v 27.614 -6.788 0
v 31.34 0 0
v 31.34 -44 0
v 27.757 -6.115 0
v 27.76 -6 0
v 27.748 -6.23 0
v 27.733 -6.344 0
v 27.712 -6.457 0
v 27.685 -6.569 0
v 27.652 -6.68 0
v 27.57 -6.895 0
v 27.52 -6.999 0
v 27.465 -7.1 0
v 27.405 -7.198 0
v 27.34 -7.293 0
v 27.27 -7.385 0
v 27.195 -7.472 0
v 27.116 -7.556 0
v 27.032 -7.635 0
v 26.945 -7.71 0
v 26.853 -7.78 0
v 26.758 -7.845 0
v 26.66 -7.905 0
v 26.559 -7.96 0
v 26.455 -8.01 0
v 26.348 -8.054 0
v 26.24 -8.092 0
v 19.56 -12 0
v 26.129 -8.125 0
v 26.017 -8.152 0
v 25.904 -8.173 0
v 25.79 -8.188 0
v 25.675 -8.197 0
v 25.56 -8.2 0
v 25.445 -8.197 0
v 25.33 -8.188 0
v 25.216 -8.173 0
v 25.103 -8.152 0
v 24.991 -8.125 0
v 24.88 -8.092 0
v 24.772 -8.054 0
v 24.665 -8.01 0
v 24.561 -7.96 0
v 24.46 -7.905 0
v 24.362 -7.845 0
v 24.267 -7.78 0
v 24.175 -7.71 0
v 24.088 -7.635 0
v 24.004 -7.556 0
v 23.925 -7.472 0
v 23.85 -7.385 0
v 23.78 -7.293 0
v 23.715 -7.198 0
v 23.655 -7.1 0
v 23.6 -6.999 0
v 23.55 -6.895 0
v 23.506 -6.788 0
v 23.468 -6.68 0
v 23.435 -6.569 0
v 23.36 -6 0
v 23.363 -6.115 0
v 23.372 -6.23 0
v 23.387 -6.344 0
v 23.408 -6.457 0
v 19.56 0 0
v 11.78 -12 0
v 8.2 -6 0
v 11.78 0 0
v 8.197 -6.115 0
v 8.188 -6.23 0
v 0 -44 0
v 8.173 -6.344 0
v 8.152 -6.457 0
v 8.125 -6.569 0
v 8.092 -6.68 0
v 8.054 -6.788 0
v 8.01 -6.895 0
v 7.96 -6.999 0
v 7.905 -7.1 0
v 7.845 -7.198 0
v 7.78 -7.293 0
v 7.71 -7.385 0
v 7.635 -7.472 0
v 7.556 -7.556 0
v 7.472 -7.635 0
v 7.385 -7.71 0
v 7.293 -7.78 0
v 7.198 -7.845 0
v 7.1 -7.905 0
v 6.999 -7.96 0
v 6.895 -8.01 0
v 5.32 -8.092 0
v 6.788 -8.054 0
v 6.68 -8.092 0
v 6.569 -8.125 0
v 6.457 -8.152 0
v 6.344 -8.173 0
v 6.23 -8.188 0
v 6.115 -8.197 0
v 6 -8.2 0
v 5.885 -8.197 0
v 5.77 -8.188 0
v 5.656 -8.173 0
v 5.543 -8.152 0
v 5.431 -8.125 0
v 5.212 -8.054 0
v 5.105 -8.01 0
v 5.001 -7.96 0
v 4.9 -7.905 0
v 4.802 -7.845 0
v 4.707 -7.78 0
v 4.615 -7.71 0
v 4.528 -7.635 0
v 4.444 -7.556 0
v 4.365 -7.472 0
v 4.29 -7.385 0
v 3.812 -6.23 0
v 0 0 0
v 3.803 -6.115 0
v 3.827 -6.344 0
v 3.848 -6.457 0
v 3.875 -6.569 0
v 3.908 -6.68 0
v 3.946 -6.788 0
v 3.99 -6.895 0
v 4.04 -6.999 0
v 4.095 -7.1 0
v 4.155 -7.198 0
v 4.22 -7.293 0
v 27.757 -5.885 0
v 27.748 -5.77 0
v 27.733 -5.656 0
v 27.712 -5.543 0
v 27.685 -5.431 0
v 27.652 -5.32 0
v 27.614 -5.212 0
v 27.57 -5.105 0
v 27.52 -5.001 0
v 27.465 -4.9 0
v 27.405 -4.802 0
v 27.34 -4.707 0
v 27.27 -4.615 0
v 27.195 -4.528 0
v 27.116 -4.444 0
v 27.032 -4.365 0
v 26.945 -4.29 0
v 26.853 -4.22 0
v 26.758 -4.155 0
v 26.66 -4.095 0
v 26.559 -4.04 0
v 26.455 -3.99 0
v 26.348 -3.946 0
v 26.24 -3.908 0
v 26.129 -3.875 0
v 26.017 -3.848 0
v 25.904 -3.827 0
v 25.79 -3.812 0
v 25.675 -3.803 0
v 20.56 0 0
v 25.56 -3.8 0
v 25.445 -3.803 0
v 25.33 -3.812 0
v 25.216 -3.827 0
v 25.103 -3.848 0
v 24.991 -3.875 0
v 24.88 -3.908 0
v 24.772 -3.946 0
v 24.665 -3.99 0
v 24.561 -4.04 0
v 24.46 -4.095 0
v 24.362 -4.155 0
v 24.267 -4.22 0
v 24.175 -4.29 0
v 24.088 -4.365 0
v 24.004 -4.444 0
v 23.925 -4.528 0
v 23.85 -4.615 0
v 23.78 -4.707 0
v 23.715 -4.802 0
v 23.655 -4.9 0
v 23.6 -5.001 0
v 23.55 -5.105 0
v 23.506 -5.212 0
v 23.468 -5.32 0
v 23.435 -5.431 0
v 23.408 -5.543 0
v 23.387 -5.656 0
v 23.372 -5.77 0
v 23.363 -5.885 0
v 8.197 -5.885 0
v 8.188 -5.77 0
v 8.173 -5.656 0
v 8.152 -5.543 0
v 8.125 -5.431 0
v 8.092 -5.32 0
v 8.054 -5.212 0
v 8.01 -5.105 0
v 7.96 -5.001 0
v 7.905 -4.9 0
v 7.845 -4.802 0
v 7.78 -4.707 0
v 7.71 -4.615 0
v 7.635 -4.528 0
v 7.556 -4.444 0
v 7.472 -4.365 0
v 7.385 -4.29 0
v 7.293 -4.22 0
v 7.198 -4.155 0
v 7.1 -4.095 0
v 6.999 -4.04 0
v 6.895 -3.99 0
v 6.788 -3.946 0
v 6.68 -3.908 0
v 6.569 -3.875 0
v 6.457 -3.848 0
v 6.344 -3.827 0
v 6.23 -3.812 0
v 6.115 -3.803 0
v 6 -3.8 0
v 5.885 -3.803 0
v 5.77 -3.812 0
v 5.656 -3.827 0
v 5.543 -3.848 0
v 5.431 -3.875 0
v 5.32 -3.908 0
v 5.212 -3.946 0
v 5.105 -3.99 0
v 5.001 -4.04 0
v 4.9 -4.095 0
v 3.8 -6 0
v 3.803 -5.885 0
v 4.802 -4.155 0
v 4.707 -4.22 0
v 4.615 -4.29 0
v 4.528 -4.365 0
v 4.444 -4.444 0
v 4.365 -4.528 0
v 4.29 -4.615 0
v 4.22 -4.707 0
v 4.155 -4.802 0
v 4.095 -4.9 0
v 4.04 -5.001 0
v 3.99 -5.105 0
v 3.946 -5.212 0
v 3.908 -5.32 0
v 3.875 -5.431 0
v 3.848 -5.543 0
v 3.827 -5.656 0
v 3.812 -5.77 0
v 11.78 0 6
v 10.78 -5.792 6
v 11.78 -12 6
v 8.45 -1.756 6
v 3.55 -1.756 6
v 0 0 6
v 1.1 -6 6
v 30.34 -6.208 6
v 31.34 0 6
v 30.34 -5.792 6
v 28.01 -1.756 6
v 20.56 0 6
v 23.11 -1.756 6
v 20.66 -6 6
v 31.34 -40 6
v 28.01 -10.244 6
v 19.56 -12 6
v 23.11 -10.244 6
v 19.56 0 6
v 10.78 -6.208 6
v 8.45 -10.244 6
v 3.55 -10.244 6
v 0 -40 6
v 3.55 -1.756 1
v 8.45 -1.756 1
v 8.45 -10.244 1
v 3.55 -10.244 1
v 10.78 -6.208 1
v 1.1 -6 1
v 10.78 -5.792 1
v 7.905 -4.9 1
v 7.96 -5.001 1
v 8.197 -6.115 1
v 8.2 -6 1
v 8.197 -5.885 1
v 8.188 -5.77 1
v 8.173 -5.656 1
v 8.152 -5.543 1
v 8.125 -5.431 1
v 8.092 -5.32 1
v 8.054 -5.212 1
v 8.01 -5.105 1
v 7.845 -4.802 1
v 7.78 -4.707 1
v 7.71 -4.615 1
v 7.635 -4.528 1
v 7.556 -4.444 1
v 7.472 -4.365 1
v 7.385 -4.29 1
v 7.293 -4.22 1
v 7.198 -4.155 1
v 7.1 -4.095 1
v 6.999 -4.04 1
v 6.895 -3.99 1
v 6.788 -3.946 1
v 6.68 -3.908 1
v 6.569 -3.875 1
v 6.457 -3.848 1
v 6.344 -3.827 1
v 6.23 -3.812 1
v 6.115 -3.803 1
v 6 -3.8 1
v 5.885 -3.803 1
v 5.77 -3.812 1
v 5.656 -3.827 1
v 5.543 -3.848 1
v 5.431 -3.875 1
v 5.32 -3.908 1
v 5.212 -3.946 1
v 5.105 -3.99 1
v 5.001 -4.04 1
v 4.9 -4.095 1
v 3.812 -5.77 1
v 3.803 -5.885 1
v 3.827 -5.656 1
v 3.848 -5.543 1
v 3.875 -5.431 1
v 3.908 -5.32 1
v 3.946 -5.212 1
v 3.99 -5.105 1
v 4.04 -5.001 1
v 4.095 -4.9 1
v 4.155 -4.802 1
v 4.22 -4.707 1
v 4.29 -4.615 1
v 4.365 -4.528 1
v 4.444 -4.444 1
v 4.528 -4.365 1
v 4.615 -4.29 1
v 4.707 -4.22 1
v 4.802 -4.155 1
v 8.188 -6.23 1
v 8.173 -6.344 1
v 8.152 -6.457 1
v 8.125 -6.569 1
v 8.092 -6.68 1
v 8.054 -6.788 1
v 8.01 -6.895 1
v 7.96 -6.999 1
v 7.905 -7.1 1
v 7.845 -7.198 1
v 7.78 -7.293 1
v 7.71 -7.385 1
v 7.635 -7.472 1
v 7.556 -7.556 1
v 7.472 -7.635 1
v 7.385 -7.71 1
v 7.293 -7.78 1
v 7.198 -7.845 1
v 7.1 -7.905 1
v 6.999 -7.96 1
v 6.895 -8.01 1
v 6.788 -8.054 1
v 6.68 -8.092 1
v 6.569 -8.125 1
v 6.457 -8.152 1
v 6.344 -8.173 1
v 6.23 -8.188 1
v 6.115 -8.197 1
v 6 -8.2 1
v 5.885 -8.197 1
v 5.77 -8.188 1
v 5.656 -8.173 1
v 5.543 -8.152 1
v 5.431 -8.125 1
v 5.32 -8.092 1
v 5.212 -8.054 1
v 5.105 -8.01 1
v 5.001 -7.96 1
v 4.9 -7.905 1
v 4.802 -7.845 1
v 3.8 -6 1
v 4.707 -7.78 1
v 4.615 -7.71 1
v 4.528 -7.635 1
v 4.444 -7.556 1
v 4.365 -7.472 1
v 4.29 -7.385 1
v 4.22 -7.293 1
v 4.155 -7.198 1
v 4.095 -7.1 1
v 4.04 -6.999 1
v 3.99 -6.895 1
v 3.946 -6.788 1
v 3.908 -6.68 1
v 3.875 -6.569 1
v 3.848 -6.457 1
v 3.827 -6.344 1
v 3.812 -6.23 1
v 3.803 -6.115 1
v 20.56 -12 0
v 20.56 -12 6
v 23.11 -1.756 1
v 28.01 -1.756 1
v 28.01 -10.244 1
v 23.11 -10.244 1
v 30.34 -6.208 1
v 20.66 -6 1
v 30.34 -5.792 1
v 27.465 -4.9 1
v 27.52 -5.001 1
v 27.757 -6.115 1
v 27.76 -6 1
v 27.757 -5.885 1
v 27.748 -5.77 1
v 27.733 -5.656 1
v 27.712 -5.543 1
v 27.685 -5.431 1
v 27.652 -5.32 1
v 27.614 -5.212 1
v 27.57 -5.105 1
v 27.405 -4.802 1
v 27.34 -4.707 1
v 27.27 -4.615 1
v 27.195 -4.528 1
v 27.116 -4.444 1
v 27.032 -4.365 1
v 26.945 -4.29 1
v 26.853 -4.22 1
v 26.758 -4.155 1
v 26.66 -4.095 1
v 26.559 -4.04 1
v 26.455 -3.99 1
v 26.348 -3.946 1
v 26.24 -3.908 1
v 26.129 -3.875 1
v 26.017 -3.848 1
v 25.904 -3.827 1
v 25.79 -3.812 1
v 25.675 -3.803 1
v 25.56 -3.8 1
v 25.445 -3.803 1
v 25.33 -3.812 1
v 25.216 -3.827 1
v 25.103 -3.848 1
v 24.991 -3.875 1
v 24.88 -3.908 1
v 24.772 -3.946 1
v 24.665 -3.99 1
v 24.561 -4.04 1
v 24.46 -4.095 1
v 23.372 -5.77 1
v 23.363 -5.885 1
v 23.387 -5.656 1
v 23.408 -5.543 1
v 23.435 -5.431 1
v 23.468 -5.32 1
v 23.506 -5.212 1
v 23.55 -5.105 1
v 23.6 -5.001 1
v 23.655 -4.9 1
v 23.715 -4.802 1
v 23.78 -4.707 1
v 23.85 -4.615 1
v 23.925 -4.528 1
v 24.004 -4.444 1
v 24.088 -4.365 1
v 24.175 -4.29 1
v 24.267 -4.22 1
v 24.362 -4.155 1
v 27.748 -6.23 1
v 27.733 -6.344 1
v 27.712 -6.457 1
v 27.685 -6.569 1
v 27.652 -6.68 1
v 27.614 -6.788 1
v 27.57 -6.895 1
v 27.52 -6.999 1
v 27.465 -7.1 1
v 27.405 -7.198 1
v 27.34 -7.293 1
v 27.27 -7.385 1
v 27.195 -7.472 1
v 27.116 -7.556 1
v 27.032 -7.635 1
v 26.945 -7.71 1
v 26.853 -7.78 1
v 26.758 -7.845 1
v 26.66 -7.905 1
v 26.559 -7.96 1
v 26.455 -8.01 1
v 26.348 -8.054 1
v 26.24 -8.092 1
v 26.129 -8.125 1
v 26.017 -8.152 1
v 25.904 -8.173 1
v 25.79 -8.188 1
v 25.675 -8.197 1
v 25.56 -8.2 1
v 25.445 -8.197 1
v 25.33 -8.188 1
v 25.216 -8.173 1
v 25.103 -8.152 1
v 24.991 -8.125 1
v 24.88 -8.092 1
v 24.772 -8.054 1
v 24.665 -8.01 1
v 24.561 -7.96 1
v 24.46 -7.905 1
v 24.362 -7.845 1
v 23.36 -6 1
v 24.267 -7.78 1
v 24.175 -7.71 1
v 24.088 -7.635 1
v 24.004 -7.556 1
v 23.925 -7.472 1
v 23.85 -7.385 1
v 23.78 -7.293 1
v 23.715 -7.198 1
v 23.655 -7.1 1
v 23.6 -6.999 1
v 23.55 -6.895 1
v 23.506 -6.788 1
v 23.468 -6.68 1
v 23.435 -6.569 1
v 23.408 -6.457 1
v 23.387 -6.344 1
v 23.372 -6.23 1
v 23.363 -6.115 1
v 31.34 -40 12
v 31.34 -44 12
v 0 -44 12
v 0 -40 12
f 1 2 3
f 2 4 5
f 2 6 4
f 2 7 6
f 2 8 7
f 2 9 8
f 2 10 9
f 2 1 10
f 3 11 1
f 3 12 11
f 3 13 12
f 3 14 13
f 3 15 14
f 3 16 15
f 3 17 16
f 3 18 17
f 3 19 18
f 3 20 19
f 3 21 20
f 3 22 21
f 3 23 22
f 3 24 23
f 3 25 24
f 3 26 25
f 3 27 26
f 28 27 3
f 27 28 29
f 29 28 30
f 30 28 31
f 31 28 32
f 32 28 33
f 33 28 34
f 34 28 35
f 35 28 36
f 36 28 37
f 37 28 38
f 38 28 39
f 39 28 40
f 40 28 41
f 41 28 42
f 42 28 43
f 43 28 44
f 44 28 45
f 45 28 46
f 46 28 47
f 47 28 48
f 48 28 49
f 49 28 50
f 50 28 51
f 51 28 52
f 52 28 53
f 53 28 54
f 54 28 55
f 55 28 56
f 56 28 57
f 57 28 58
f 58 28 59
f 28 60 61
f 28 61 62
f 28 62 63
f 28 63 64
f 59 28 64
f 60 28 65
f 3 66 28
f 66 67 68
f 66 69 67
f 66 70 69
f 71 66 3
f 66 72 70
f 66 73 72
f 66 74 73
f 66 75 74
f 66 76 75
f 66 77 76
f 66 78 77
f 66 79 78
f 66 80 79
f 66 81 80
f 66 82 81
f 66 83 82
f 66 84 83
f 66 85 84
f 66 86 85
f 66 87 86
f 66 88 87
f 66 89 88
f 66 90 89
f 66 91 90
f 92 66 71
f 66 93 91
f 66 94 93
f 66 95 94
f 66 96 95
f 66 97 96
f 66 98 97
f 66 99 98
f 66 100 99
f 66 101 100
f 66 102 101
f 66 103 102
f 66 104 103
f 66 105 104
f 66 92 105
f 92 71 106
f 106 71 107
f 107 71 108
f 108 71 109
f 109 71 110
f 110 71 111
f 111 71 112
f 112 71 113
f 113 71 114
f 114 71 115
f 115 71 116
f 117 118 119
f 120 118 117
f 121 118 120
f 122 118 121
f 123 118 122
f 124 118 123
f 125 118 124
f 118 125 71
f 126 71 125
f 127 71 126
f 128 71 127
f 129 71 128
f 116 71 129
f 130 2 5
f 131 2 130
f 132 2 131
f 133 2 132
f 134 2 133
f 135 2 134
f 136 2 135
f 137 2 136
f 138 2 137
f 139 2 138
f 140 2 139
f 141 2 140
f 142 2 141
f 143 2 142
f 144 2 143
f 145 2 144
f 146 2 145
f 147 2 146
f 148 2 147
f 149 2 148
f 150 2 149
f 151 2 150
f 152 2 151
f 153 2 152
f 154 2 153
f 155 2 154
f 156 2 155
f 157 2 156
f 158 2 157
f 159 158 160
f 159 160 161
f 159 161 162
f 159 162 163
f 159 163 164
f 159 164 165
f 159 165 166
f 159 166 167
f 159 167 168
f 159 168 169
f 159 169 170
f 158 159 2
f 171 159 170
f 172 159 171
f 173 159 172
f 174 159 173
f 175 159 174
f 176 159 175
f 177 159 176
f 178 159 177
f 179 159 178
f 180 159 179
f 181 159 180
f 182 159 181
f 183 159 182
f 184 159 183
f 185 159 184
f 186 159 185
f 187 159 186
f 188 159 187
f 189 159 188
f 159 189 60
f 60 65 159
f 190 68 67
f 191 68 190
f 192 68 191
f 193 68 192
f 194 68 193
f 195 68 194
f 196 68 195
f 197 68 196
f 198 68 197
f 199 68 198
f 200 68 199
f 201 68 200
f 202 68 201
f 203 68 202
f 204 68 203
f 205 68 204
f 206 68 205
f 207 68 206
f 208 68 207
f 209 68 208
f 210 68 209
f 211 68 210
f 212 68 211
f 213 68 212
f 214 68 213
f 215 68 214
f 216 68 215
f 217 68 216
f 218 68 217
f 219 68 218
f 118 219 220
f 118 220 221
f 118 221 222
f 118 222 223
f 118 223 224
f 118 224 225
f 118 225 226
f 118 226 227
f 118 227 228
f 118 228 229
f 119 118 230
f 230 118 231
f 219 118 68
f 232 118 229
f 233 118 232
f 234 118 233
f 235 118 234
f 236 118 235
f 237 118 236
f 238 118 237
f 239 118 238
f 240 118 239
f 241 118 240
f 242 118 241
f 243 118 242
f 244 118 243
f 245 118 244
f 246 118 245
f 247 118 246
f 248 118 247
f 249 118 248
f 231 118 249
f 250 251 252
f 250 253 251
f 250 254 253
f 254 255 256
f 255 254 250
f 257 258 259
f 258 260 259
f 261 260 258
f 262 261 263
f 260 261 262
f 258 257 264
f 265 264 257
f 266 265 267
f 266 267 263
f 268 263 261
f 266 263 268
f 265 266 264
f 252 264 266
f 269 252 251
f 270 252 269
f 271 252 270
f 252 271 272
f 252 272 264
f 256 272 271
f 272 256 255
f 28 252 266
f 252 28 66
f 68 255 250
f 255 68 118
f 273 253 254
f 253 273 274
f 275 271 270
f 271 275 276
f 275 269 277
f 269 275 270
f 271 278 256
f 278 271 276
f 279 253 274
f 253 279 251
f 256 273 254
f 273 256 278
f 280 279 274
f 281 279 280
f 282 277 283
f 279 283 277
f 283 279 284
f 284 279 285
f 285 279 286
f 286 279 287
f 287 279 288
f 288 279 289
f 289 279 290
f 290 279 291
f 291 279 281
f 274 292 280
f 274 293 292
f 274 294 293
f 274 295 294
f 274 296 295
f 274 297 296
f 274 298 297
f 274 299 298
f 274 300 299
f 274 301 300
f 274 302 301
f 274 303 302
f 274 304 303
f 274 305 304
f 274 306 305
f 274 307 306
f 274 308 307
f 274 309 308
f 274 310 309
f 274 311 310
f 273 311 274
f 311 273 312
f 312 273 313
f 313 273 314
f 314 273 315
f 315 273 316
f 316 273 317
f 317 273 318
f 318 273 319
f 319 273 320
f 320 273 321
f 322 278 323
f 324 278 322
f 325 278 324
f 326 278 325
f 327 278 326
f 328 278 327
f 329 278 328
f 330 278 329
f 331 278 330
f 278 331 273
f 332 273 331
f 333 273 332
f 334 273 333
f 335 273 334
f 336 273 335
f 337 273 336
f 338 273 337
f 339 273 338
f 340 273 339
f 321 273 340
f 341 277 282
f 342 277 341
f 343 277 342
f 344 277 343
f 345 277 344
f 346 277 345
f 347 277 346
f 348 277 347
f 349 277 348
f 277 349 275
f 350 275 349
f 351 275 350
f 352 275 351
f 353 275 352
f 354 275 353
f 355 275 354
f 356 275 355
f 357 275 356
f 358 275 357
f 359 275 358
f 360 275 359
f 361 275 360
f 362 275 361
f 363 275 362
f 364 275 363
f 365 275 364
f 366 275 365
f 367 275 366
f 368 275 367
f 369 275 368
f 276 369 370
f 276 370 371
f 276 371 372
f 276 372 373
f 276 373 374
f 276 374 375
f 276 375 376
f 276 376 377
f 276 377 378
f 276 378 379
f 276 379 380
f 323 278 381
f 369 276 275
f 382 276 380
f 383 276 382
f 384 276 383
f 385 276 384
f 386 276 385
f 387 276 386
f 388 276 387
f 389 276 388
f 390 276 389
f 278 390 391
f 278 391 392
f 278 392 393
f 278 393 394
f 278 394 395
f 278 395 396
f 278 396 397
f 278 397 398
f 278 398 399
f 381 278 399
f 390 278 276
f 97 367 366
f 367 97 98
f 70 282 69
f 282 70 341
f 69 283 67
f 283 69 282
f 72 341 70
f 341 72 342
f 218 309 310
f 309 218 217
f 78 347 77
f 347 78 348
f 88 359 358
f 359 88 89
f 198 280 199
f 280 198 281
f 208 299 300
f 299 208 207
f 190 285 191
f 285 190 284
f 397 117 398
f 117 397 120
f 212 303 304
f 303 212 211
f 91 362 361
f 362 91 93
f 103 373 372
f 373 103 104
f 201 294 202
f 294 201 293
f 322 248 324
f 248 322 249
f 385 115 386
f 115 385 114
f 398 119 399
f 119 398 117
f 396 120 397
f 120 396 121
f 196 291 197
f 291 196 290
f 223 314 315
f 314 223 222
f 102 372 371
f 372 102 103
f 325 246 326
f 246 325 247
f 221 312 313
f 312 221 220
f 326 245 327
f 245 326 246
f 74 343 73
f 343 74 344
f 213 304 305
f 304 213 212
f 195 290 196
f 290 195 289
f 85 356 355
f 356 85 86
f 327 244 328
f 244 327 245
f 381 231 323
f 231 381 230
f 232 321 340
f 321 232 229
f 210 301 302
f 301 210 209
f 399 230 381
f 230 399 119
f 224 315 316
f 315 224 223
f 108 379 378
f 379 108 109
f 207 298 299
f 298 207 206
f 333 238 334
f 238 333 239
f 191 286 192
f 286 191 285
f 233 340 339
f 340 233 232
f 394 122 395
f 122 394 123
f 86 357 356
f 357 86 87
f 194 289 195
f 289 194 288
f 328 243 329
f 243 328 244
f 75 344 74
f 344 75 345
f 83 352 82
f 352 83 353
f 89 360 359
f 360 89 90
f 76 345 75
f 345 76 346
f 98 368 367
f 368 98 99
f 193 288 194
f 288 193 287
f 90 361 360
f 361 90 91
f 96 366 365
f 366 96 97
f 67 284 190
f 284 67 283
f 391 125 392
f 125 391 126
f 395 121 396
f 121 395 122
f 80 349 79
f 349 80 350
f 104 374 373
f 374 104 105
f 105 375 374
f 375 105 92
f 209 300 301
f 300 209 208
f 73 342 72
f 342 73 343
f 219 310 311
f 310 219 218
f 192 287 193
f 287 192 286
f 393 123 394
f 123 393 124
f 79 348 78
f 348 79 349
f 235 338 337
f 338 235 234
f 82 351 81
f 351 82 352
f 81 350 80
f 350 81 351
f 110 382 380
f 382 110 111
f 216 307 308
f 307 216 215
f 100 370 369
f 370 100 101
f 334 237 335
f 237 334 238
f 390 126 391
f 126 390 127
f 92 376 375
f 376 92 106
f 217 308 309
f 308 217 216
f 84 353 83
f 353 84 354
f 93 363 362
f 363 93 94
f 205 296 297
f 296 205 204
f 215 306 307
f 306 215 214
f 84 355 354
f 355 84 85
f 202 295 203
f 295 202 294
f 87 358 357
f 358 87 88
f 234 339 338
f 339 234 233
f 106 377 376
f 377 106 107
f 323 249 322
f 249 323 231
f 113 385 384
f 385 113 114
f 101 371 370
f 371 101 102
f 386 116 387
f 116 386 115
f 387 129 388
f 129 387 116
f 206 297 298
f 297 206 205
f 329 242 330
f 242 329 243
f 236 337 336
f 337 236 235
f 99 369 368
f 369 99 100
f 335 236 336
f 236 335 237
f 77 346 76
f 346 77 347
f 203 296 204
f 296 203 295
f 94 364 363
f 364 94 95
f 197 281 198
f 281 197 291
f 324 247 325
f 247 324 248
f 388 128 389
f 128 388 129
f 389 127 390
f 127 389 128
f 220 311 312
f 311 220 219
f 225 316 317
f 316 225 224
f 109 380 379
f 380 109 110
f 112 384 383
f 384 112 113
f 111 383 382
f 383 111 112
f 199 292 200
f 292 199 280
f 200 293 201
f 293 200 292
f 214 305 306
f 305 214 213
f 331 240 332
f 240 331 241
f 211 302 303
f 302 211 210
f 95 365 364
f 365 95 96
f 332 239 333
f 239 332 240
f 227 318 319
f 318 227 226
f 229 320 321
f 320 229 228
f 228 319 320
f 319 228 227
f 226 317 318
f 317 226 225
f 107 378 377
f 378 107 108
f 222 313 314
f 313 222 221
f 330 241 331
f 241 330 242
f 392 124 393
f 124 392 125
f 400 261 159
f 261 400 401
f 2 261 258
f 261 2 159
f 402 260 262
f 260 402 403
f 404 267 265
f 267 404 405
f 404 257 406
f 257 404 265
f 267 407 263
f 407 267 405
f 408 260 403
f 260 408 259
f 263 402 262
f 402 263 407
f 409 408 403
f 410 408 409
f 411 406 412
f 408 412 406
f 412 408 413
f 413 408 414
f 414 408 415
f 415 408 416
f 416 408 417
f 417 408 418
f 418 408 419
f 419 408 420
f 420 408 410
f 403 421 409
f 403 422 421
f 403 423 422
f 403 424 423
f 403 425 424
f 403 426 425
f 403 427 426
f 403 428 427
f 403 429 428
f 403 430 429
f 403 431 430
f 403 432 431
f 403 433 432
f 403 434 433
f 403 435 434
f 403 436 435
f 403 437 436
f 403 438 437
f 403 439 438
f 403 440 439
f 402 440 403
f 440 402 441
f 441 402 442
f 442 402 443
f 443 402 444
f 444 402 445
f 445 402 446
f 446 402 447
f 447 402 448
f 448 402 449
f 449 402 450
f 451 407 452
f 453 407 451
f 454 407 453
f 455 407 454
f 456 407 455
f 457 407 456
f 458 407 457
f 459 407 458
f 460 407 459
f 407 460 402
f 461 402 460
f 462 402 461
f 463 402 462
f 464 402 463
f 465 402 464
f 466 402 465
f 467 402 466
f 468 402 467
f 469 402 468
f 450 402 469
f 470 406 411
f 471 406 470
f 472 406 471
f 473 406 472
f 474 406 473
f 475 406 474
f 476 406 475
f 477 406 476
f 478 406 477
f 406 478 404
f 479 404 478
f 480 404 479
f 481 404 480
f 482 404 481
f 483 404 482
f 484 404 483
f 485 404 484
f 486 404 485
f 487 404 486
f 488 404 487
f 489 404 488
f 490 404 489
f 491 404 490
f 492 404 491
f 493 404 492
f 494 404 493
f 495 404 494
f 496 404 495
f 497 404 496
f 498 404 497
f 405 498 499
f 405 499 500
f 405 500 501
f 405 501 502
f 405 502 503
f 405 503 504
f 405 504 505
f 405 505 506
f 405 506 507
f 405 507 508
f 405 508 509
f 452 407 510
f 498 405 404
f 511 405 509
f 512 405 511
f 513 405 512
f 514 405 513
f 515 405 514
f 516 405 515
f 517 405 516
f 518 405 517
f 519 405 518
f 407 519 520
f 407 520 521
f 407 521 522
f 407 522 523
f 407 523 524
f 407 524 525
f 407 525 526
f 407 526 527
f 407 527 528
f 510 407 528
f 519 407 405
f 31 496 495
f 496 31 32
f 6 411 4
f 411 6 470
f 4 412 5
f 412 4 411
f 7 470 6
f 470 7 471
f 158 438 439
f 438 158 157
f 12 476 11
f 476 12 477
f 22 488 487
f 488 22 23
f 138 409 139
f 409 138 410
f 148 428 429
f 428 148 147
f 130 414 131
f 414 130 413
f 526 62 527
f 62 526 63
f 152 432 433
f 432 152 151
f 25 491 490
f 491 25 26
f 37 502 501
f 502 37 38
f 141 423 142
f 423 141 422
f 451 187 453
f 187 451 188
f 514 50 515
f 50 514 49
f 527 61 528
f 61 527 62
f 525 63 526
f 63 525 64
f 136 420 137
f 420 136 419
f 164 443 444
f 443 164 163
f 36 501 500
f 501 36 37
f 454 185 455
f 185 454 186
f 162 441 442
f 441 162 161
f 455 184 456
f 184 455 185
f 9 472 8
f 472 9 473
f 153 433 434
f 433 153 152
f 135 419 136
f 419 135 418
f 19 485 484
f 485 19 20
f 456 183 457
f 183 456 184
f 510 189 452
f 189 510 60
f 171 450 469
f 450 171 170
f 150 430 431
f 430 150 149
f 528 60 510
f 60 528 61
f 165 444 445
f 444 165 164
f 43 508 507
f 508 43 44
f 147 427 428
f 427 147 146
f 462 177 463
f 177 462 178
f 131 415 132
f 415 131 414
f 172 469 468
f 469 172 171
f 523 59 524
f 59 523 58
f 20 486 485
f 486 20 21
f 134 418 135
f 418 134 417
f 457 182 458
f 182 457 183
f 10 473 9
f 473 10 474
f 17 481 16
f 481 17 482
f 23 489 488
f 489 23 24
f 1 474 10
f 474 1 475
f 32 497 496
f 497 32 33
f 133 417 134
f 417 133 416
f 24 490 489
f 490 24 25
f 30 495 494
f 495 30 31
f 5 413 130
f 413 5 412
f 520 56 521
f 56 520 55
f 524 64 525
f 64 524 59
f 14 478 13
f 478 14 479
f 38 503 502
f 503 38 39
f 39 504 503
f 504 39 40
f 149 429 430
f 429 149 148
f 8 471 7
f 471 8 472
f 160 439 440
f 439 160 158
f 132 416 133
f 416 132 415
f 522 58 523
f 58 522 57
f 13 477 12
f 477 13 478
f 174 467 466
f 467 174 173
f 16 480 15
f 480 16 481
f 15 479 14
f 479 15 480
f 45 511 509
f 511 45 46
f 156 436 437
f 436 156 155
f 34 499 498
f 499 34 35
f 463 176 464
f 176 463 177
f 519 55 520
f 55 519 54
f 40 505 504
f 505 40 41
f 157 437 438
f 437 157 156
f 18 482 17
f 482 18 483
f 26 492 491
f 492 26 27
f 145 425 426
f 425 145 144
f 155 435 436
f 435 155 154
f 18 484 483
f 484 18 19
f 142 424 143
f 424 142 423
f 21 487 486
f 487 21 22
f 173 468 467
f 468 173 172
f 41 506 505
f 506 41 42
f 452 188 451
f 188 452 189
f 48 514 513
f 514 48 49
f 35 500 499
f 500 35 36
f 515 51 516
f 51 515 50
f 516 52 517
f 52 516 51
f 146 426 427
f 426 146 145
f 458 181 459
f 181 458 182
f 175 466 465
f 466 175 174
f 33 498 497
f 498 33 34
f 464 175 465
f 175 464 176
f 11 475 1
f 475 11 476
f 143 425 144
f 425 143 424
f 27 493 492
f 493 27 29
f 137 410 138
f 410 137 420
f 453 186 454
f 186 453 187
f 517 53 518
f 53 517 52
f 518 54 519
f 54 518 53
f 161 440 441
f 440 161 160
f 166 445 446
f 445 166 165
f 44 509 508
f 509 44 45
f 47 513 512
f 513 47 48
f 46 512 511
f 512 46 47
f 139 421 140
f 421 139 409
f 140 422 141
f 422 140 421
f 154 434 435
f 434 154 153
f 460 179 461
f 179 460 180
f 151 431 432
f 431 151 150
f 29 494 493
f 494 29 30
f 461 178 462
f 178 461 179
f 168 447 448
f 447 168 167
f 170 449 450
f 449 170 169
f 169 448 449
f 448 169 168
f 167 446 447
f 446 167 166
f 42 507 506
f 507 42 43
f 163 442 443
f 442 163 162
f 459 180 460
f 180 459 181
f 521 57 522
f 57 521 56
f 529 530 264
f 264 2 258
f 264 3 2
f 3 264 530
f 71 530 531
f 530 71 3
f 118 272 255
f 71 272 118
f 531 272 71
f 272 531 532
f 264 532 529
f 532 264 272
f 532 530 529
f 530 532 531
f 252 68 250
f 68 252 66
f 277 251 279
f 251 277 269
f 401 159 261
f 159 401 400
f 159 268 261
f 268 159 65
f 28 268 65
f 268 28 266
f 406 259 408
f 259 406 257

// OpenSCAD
// Real Lonely T-Rex Game: Bar Mount
// Copyright (C) 2017, Uri Shaked and Ariella Eliassaf

$fn=120;

nyloc_nut_hole_r = 7.8/2+1;
nyloc_nut_depth = 5;
hole_spacing = 9.78;
total_width = 2+hole_spacing*3;
height = 44;
bar_height = 4;

module nyloc_mount(depth=10) {
    translate([0,depth,0])
    rotate([90,0,0])
    difference() {
        cube([10,12,depth]);
        
        translate([5,6,0])
        cylinder(r=nyloc_nut_hole_r,h=nyloc_nut_depth,$fn=6);

        translate([5,6,5])
        cylinder(r=2.2,h=depth-nyloc_nut_depth);
    }
}

rotate([90,0,0])
union() {
    translate([0,0,12])
    cube([total_width,6,height-12]);

    translate([0,0,height-bar_height])
    cube([total_width,12,bar_height]);


    cube([1,6,12]);

    translate([1,0,0])
    nyloc_mount(6);

    translate([1+hole_spacing,0,0])
    cube([1,6,12]);

    translate([1+hole_spacing*2-1,0,0])
    cube([1,6,12]);

    translate([1+hole_spacing*2,0,0])
    nyloc_mount(6);

    translate([1+hole_spacing*3,0,0])
    cube([1,6,12]);
}
